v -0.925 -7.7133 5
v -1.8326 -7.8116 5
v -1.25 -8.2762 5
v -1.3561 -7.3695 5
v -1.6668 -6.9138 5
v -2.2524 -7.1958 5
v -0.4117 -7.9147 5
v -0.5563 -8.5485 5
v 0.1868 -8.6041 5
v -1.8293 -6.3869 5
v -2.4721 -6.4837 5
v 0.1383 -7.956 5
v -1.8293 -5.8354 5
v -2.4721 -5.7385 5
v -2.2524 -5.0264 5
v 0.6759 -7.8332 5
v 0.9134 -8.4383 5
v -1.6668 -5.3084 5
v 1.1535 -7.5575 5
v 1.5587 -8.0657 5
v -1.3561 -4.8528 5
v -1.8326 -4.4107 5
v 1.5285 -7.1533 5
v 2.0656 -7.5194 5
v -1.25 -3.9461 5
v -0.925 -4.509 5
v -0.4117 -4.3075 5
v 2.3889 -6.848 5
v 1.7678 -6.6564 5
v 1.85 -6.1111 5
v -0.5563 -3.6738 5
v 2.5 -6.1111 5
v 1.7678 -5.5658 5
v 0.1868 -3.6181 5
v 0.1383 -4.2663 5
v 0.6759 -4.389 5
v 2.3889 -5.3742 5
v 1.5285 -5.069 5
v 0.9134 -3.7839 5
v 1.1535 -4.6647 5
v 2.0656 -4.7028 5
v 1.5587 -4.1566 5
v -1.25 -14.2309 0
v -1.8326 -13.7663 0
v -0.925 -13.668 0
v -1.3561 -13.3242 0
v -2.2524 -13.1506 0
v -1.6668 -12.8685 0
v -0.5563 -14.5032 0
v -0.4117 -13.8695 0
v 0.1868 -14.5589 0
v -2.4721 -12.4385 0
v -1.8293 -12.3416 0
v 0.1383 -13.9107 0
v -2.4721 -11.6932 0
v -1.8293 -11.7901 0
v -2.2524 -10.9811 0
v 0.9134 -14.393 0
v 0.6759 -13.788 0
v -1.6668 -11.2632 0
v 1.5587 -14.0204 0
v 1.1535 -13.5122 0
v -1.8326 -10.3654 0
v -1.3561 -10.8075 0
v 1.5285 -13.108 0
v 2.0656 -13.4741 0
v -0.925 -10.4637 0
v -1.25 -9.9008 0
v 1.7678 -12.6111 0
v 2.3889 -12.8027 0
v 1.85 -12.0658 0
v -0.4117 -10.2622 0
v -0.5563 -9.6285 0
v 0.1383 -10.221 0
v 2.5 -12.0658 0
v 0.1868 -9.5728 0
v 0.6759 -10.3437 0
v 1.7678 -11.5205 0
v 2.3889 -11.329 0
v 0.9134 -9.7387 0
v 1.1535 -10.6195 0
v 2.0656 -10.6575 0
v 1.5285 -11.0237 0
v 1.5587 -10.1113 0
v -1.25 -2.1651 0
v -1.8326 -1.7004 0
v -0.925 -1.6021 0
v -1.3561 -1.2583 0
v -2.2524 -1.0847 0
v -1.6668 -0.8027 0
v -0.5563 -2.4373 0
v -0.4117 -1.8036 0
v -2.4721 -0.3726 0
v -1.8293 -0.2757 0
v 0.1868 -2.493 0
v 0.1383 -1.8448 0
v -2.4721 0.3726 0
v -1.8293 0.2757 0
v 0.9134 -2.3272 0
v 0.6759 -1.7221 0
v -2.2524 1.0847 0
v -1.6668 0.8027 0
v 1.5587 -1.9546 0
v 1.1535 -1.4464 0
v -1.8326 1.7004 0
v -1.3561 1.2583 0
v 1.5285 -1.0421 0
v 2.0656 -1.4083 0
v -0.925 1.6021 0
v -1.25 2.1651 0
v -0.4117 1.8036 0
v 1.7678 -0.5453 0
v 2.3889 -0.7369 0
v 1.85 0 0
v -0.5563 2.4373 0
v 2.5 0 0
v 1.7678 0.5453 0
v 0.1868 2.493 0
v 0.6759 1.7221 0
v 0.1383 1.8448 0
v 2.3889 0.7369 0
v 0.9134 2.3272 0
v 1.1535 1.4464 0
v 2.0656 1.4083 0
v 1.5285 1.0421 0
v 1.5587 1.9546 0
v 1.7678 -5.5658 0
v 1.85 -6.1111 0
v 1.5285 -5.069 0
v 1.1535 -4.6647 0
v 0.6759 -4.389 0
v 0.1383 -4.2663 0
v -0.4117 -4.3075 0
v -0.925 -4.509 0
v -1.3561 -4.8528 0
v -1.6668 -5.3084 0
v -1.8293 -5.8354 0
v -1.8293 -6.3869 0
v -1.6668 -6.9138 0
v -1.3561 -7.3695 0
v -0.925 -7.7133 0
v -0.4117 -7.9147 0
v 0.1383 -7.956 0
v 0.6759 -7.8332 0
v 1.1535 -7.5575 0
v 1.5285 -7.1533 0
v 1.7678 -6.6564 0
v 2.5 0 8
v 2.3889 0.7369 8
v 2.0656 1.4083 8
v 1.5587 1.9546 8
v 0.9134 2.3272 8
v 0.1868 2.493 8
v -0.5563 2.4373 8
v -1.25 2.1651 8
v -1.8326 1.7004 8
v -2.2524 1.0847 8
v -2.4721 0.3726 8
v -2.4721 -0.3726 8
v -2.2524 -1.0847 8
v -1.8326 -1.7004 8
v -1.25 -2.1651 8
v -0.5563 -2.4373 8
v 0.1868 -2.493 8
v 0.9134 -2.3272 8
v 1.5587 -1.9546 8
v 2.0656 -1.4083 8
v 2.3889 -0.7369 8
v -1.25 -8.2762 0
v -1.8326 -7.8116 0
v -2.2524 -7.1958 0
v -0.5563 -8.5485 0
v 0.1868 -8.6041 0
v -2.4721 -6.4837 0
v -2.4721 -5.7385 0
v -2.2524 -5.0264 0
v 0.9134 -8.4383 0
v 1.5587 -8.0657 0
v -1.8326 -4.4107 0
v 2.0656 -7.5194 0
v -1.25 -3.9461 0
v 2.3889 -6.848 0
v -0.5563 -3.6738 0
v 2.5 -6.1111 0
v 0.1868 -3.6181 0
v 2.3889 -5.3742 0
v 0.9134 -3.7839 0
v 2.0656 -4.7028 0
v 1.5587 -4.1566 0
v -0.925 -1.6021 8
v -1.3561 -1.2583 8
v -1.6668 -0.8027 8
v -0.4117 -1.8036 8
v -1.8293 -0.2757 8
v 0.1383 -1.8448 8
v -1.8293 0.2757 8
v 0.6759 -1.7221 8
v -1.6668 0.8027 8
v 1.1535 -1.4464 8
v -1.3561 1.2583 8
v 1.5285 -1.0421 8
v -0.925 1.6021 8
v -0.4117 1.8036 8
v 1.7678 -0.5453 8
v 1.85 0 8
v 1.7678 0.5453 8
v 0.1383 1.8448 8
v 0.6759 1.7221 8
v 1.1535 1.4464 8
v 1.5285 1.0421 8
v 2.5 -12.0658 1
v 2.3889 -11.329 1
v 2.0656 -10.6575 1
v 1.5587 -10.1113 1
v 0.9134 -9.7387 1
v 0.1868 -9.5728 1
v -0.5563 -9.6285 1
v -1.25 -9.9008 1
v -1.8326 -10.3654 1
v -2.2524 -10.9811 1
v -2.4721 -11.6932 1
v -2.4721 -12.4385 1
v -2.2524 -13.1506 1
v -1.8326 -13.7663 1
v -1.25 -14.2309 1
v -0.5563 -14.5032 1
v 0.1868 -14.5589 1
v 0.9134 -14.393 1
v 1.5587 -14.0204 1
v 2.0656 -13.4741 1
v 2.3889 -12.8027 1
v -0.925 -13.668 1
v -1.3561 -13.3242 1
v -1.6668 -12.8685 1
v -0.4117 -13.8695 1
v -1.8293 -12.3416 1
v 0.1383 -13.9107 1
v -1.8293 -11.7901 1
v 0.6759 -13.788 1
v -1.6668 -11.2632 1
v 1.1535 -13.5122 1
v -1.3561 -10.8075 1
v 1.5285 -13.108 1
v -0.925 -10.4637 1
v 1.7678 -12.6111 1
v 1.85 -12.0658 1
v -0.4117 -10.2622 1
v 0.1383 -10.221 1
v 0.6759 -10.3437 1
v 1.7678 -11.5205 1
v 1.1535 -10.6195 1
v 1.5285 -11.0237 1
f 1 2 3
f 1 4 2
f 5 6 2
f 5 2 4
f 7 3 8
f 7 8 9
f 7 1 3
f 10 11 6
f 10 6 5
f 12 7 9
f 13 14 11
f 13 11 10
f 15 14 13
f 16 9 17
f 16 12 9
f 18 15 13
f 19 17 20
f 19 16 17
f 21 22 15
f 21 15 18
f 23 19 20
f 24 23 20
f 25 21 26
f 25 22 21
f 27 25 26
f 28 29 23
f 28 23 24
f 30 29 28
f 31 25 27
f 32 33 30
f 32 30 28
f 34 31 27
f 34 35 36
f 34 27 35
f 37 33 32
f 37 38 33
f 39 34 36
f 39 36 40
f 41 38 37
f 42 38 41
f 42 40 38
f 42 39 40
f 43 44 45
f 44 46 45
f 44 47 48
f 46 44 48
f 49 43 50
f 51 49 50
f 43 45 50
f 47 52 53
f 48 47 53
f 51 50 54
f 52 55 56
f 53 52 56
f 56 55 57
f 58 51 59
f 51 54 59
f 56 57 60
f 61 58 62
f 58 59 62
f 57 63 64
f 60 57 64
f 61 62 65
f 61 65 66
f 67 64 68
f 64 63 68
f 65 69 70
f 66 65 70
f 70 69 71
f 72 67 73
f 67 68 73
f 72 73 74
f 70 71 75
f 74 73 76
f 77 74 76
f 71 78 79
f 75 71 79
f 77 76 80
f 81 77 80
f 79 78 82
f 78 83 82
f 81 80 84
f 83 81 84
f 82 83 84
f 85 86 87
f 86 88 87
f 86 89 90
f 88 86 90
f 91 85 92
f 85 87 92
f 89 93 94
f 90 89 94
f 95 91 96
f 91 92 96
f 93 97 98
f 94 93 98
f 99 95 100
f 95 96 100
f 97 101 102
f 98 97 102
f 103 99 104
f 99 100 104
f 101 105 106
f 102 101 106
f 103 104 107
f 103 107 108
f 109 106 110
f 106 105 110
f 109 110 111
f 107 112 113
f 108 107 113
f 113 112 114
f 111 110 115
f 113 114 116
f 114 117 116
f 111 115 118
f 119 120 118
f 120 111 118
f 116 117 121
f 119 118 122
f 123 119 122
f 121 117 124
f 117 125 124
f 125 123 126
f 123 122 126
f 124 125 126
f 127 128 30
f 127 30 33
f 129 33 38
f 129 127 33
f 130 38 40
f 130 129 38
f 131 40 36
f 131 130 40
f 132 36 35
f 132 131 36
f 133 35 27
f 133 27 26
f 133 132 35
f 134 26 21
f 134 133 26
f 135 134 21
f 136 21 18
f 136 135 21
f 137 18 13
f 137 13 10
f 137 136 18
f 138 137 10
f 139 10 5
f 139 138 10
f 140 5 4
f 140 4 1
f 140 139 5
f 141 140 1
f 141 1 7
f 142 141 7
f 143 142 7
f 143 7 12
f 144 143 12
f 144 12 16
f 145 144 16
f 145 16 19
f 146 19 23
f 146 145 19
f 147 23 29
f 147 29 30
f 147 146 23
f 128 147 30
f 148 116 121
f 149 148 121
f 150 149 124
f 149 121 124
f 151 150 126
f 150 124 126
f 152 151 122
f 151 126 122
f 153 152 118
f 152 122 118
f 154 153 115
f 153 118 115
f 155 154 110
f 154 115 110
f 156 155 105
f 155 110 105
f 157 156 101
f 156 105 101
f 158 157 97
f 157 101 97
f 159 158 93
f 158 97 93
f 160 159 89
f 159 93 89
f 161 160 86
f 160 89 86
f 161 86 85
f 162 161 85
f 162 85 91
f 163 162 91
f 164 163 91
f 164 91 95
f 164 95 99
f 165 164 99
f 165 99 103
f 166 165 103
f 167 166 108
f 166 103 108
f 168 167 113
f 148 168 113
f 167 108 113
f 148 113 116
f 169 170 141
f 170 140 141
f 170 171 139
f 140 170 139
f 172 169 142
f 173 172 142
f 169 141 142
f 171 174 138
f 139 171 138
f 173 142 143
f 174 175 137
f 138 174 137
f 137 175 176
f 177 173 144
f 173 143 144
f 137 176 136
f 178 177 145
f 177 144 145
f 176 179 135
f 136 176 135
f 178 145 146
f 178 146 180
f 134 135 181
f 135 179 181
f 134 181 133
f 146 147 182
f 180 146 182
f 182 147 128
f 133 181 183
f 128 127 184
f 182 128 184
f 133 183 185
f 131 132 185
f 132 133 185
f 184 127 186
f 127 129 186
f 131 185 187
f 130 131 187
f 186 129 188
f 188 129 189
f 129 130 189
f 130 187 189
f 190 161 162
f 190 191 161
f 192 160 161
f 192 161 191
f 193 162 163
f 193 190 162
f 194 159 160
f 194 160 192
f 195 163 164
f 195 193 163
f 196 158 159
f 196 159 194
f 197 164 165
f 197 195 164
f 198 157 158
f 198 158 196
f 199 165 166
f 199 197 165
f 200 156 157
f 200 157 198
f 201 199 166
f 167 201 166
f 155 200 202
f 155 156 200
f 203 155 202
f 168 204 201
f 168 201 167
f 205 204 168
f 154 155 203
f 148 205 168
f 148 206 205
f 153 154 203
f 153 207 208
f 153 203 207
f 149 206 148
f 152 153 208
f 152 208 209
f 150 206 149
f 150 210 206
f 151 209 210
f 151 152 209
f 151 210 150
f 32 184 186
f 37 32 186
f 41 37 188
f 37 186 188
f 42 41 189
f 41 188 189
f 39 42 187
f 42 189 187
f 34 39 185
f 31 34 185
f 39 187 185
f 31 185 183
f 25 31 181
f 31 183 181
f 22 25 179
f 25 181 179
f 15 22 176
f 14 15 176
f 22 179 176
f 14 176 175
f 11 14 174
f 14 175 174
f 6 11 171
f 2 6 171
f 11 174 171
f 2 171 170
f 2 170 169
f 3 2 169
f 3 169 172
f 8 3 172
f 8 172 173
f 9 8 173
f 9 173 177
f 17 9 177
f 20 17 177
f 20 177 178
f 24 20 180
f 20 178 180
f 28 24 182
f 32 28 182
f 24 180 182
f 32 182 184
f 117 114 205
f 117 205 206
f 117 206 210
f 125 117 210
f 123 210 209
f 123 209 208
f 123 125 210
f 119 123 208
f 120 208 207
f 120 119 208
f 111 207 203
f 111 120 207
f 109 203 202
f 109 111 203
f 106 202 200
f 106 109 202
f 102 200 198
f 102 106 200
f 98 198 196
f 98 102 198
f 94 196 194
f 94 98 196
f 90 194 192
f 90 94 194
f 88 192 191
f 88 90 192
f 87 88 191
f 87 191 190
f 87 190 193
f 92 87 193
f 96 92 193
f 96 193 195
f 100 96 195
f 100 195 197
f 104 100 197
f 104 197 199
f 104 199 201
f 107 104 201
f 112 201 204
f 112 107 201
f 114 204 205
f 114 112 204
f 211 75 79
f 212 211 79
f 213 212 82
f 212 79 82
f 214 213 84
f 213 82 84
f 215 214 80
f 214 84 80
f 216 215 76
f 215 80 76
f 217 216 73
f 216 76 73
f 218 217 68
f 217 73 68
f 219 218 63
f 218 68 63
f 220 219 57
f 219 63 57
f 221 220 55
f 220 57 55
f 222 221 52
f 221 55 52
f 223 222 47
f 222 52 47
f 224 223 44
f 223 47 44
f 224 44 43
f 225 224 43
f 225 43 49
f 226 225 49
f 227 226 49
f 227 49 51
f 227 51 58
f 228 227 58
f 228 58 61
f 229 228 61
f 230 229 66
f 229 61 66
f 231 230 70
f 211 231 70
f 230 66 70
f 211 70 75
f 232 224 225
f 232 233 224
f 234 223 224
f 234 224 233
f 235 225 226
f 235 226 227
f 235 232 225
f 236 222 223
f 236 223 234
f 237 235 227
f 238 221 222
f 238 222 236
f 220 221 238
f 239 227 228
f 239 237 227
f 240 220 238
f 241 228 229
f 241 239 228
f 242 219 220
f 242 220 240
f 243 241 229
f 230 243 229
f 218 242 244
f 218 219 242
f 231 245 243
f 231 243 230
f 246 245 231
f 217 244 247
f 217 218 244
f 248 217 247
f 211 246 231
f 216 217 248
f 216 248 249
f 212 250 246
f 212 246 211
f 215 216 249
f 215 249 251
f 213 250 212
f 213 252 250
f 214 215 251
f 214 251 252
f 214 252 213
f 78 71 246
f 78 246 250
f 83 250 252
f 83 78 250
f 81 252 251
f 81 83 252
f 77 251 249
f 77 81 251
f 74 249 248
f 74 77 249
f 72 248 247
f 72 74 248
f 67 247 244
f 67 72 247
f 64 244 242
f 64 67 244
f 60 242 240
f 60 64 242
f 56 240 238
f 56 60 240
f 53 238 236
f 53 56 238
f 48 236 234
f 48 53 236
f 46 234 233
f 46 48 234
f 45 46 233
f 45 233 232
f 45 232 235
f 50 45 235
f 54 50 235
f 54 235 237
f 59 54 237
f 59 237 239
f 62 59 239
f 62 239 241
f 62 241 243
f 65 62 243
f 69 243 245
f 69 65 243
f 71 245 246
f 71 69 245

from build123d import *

# Parameters (mm, degrees)
F0_R     = 2.5
F0_R_2   = 1.85
F1_DEPTH = 8
F2_DEPTH = 5
F3_DEPTH = 1


with BuildPart() as f1:
    # F0 (on Top) → F1 (new body)
    with BuildSketch(Plane.XY):
        Circle(F0_R)
        Circle(F0_R_2, mode=Mode.SUBTRACT)
    extrude(amount=F1_DEPTH)


with BuildPart() as f2:
    # F0 (on Top) → F2 (new body)
    with BuildSketch(Plane.XY):
        with Locations((0, -6.111133)):
            Circle(F0_R)
        with Locations((0, -6.111133)):
            Circle(F0_R_2, mode=Mode.SUBTRACT)
    extrude(amount=F2_DEPTH)


with BuildPart() as f3:
    # F0 (on Top) → F3 (new body)
    with BuildSketch(Plane.XY):
        with Locations((0, -12.065846)):
            Circle(F0_R)
        with Locations((0, -12.065846)):
            Circle(F0_R_2, mode=Mode.SUBTRACT)
    extrude(amount=F3_DEPTH)


solid = Compound([f1.part, f2.part, f3.part])
